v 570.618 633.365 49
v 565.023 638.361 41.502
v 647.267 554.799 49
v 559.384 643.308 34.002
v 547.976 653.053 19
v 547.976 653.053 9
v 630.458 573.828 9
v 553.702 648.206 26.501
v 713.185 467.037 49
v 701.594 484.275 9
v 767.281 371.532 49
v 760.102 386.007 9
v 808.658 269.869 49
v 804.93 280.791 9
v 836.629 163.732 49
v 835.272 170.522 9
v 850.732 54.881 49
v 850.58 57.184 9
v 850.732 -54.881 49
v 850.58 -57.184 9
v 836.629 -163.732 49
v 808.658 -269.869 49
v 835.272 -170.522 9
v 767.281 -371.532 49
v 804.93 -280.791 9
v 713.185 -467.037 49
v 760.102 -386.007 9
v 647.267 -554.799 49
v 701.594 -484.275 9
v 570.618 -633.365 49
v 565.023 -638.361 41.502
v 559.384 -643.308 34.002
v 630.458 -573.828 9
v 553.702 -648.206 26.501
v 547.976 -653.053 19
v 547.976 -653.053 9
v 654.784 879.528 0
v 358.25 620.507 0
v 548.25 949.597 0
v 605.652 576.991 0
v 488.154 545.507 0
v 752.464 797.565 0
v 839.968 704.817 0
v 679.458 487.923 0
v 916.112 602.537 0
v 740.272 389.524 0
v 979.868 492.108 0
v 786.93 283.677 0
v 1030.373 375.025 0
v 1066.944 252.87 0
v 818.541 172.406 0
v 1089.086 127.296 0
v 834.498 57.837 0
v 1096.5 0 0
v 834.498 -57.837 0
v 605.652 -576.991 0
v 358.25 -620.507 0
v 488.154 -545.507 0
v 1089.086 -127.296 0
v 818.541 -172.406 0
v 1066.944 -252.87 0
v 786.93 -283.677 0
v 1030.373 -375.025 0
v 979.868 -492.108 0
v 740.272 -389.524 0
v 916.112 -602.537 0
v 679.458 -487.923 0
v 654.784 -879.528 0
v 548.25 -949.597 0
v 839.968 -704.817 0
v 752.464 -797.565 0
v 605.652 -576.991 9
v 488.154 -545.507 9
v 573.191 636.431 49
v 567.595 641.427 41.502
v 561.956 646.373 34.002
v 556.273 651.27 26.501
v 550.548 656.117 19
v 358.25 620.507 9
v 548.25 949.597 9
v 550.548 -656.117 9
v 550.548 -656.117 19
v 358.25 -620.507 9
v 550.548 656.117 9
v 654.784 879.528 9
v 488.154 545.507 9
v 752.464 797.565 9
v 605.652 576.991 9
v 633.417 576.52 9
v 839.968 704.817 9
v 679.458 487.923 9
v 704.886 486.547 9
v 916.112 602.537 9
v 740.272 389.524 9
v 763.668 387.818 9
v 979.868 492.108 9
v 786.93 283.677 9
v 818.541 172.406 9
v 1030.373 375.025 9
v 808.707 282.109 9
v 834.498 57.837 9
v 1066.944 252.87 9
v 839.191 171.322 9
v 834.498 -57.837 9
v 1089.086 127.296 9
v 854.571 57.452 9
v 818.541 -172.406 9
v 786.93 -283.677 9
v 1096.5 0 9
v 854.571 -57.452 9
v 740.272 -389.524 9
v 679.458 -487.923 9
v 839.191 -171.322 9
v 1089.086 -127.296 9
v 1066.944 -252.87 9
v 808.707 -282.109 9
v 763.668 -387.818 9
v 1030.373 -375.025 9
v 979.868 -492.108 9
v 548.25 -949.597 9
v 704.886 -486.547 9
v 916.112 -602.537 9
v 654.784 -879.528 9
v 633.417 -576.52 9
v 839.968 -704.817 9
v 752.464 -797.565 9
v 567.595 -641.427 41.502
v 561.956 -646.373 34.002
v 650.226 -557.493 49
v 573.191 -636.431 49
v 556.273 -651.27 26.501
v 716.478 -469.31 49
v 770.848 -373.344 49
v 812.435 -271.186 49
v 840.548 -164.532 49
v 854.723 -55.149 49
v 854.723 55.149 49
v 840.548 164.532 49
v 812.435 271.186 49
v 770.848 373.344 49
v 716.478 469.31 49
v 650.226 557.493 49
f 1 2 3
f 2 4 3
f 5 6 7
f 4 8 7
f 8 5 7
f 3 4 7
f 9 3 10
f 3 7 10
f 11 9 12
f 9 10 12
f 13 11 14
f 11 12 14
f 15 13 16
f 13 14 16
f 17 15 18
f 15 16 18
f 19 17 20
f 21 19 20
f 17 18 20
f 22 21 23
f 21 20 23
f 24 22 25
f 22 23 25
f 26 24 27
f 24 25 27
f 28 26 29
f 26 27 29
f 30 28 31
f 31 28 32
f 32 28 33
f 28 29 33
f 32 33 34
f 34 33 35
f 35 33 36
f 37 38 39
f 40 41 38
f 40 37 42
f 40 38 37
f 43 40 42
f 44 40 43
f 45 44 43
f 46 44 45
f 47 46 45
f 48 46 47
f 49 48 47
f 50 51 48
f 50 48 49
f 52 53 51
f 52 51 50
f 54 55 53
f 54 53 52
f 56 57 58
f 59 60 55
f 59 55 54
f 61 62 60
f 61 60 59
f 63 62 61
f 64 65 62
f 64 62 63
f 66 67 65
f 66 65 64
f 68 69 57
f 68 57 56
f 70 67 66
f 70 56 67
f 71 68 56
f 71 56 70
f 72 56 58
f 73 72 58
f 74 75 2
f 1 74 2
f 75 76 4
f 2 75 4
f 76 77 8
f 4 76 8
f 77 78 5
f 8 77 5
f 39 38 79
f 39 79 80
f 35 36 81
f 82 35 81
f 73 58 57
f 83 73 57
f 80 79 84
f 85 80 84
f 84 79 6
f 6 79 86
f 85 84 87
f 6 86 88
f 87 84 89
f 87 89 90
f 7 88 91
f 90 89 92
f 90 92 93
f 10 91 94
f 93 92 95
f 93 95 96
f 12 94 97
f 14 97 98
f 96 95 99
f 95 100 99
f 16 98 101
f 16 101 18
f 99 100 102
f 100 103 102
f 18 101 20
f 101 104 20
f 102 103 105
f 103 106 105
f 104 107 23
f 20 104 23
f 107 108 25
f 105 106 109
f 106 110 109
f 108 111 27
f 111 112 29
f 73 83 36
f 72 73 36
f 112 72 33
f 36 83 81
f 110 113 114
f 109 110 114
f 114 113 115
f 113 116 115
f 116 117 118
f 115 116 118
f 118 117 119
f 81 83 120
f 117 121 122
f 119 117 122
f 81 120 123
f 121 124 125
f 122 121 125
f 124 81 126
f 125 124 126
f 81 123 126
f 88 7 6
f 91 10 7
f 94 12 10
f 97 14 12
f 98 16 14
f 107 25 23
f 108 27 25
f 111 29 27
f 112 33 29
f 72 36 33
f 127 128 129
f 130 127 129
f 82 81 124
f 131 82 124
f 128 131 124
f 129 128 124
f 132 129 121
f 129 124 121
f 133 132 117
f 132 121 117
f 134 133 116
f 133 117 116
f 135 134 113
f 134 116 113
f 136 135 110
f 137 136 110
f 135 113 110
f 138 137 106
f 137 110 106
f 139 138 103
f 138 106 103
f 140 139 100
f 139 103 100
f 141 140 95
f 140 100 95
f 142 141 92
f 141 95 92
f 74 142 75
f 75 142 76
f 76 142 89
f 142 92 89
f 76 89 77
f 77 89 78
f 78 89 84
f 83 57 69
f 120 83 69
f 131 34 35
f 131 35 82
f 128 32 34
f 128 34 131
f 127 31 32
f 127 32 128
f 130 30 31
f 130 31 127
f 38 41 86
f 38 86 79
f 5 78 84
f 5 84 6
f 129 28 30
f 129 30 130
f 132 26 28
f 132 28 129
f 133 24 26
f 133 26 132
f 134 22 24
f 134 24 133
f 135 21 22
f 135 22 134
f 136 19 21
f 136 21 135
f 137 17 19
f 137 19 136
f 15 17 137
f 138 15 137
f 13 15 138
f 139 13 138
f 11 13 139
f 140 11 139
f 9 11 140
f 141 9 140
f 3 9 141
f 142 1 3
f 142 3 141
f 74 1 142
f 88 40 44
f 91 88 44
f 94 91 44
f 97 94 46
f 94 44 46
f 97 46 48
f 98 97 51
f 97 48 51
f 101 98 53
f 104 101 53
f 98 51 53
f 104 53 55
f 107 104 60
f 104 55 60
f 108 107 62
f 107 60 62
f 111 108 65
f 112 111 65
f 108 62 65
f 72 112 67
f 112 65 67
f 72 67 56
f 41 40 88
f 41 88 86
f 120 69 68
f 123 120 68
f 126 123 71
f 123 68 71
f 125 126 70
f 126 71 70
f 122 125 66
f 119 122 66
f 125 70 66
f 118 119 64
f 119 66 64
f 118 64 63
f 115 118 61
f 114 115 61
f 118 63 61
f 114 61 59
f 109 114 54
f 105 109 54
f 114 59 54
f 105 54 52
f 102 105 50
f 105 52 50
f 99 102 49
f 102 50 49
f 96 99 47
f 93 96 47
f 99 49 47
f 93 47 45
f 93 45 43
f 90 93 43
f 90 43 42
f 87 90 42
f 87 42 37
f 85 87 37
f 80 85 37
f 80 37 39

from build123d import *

# Parameters (mm, degrees)
F1_DEPTH = 9
F3_DEPTH = 40
F5_DEPTH = 9
F7_SIZE2 = 30
F7_SIZE  = 30


with BuildPart() as f1:
    # F0 (on Top) → F1 (new body)
    with BuildSketch(Plane.XY):
        with BuildLine():
            Line((418.25, -724.4302502657), (548.25, -949.5968552496))
            ThreePointArc((548.25, -949.5968552496), (1096.5, 0), (548.25, 949.5968552496))
            Line((548.25, 949.5968552496), (418.25, 724.4302502657))
            ThreePointArc((418.25, 724.4302502657), (836.5, 0), (418.25, -724.4302502657))
        make_face()
    extrude(amount=F1_DEPTH)

    # F2 (on face) → F3 (join)
    with BuildSketch(Plane.XY.offset(9)):
        with BuildLine():
            Line((547.9764372578, -653.0528877589), (550.5475876965, -656.1170655314))
            ThreePointArc((550.5475876965, -656.1170655314), (856.5, 0), (550.5475876965, 656.1170655314))
            Line((550.5475876965, 656.1170655314), (547.9764372578, 653.0528877589))
            ThreePointArc((547.9764372578, 653.0528877589), (852.5, 0), (547.9764372578, -653.0528877589))
        make_face()
    extrude(amount=F3_DEPTH)

    # F4 (on face) → F5 (join)
    with BuildSketch(Plane.XY):
        with BuildLine():
            Line((358.25, -620.5072018116), (418.25, -724.4302502657))
            ThreePointArc((418.25, -724.4302502657), (517.2313730049, -657.4222058765), (605.651725766, -576.9906733013))
            Line((605.651725766, -576.9906733013), (488.1538105677, -545.5072018115))
            Line((488.1538105677, -545.5072018115), (358.25, -620.5072018116))
        make_face()
    extrude(amount=F5_DEPTH)

    # F6: F1 across plane


with BuildPart() as f1_1:
    add(f1.part)
    add(f1.part.mirror(Plane.XZ))

    # F7
    f7_edges = [f1_1.edges().sort_by_distance(p)[0] for p in [
        (549.262012, -654.584977, 49),
        (549.262012, 654.584977, 49),
    ]]
    chamfer(f7_edges, length=F7_SIZE, length2=F7_SIZE2)


solid = f1_1.part
